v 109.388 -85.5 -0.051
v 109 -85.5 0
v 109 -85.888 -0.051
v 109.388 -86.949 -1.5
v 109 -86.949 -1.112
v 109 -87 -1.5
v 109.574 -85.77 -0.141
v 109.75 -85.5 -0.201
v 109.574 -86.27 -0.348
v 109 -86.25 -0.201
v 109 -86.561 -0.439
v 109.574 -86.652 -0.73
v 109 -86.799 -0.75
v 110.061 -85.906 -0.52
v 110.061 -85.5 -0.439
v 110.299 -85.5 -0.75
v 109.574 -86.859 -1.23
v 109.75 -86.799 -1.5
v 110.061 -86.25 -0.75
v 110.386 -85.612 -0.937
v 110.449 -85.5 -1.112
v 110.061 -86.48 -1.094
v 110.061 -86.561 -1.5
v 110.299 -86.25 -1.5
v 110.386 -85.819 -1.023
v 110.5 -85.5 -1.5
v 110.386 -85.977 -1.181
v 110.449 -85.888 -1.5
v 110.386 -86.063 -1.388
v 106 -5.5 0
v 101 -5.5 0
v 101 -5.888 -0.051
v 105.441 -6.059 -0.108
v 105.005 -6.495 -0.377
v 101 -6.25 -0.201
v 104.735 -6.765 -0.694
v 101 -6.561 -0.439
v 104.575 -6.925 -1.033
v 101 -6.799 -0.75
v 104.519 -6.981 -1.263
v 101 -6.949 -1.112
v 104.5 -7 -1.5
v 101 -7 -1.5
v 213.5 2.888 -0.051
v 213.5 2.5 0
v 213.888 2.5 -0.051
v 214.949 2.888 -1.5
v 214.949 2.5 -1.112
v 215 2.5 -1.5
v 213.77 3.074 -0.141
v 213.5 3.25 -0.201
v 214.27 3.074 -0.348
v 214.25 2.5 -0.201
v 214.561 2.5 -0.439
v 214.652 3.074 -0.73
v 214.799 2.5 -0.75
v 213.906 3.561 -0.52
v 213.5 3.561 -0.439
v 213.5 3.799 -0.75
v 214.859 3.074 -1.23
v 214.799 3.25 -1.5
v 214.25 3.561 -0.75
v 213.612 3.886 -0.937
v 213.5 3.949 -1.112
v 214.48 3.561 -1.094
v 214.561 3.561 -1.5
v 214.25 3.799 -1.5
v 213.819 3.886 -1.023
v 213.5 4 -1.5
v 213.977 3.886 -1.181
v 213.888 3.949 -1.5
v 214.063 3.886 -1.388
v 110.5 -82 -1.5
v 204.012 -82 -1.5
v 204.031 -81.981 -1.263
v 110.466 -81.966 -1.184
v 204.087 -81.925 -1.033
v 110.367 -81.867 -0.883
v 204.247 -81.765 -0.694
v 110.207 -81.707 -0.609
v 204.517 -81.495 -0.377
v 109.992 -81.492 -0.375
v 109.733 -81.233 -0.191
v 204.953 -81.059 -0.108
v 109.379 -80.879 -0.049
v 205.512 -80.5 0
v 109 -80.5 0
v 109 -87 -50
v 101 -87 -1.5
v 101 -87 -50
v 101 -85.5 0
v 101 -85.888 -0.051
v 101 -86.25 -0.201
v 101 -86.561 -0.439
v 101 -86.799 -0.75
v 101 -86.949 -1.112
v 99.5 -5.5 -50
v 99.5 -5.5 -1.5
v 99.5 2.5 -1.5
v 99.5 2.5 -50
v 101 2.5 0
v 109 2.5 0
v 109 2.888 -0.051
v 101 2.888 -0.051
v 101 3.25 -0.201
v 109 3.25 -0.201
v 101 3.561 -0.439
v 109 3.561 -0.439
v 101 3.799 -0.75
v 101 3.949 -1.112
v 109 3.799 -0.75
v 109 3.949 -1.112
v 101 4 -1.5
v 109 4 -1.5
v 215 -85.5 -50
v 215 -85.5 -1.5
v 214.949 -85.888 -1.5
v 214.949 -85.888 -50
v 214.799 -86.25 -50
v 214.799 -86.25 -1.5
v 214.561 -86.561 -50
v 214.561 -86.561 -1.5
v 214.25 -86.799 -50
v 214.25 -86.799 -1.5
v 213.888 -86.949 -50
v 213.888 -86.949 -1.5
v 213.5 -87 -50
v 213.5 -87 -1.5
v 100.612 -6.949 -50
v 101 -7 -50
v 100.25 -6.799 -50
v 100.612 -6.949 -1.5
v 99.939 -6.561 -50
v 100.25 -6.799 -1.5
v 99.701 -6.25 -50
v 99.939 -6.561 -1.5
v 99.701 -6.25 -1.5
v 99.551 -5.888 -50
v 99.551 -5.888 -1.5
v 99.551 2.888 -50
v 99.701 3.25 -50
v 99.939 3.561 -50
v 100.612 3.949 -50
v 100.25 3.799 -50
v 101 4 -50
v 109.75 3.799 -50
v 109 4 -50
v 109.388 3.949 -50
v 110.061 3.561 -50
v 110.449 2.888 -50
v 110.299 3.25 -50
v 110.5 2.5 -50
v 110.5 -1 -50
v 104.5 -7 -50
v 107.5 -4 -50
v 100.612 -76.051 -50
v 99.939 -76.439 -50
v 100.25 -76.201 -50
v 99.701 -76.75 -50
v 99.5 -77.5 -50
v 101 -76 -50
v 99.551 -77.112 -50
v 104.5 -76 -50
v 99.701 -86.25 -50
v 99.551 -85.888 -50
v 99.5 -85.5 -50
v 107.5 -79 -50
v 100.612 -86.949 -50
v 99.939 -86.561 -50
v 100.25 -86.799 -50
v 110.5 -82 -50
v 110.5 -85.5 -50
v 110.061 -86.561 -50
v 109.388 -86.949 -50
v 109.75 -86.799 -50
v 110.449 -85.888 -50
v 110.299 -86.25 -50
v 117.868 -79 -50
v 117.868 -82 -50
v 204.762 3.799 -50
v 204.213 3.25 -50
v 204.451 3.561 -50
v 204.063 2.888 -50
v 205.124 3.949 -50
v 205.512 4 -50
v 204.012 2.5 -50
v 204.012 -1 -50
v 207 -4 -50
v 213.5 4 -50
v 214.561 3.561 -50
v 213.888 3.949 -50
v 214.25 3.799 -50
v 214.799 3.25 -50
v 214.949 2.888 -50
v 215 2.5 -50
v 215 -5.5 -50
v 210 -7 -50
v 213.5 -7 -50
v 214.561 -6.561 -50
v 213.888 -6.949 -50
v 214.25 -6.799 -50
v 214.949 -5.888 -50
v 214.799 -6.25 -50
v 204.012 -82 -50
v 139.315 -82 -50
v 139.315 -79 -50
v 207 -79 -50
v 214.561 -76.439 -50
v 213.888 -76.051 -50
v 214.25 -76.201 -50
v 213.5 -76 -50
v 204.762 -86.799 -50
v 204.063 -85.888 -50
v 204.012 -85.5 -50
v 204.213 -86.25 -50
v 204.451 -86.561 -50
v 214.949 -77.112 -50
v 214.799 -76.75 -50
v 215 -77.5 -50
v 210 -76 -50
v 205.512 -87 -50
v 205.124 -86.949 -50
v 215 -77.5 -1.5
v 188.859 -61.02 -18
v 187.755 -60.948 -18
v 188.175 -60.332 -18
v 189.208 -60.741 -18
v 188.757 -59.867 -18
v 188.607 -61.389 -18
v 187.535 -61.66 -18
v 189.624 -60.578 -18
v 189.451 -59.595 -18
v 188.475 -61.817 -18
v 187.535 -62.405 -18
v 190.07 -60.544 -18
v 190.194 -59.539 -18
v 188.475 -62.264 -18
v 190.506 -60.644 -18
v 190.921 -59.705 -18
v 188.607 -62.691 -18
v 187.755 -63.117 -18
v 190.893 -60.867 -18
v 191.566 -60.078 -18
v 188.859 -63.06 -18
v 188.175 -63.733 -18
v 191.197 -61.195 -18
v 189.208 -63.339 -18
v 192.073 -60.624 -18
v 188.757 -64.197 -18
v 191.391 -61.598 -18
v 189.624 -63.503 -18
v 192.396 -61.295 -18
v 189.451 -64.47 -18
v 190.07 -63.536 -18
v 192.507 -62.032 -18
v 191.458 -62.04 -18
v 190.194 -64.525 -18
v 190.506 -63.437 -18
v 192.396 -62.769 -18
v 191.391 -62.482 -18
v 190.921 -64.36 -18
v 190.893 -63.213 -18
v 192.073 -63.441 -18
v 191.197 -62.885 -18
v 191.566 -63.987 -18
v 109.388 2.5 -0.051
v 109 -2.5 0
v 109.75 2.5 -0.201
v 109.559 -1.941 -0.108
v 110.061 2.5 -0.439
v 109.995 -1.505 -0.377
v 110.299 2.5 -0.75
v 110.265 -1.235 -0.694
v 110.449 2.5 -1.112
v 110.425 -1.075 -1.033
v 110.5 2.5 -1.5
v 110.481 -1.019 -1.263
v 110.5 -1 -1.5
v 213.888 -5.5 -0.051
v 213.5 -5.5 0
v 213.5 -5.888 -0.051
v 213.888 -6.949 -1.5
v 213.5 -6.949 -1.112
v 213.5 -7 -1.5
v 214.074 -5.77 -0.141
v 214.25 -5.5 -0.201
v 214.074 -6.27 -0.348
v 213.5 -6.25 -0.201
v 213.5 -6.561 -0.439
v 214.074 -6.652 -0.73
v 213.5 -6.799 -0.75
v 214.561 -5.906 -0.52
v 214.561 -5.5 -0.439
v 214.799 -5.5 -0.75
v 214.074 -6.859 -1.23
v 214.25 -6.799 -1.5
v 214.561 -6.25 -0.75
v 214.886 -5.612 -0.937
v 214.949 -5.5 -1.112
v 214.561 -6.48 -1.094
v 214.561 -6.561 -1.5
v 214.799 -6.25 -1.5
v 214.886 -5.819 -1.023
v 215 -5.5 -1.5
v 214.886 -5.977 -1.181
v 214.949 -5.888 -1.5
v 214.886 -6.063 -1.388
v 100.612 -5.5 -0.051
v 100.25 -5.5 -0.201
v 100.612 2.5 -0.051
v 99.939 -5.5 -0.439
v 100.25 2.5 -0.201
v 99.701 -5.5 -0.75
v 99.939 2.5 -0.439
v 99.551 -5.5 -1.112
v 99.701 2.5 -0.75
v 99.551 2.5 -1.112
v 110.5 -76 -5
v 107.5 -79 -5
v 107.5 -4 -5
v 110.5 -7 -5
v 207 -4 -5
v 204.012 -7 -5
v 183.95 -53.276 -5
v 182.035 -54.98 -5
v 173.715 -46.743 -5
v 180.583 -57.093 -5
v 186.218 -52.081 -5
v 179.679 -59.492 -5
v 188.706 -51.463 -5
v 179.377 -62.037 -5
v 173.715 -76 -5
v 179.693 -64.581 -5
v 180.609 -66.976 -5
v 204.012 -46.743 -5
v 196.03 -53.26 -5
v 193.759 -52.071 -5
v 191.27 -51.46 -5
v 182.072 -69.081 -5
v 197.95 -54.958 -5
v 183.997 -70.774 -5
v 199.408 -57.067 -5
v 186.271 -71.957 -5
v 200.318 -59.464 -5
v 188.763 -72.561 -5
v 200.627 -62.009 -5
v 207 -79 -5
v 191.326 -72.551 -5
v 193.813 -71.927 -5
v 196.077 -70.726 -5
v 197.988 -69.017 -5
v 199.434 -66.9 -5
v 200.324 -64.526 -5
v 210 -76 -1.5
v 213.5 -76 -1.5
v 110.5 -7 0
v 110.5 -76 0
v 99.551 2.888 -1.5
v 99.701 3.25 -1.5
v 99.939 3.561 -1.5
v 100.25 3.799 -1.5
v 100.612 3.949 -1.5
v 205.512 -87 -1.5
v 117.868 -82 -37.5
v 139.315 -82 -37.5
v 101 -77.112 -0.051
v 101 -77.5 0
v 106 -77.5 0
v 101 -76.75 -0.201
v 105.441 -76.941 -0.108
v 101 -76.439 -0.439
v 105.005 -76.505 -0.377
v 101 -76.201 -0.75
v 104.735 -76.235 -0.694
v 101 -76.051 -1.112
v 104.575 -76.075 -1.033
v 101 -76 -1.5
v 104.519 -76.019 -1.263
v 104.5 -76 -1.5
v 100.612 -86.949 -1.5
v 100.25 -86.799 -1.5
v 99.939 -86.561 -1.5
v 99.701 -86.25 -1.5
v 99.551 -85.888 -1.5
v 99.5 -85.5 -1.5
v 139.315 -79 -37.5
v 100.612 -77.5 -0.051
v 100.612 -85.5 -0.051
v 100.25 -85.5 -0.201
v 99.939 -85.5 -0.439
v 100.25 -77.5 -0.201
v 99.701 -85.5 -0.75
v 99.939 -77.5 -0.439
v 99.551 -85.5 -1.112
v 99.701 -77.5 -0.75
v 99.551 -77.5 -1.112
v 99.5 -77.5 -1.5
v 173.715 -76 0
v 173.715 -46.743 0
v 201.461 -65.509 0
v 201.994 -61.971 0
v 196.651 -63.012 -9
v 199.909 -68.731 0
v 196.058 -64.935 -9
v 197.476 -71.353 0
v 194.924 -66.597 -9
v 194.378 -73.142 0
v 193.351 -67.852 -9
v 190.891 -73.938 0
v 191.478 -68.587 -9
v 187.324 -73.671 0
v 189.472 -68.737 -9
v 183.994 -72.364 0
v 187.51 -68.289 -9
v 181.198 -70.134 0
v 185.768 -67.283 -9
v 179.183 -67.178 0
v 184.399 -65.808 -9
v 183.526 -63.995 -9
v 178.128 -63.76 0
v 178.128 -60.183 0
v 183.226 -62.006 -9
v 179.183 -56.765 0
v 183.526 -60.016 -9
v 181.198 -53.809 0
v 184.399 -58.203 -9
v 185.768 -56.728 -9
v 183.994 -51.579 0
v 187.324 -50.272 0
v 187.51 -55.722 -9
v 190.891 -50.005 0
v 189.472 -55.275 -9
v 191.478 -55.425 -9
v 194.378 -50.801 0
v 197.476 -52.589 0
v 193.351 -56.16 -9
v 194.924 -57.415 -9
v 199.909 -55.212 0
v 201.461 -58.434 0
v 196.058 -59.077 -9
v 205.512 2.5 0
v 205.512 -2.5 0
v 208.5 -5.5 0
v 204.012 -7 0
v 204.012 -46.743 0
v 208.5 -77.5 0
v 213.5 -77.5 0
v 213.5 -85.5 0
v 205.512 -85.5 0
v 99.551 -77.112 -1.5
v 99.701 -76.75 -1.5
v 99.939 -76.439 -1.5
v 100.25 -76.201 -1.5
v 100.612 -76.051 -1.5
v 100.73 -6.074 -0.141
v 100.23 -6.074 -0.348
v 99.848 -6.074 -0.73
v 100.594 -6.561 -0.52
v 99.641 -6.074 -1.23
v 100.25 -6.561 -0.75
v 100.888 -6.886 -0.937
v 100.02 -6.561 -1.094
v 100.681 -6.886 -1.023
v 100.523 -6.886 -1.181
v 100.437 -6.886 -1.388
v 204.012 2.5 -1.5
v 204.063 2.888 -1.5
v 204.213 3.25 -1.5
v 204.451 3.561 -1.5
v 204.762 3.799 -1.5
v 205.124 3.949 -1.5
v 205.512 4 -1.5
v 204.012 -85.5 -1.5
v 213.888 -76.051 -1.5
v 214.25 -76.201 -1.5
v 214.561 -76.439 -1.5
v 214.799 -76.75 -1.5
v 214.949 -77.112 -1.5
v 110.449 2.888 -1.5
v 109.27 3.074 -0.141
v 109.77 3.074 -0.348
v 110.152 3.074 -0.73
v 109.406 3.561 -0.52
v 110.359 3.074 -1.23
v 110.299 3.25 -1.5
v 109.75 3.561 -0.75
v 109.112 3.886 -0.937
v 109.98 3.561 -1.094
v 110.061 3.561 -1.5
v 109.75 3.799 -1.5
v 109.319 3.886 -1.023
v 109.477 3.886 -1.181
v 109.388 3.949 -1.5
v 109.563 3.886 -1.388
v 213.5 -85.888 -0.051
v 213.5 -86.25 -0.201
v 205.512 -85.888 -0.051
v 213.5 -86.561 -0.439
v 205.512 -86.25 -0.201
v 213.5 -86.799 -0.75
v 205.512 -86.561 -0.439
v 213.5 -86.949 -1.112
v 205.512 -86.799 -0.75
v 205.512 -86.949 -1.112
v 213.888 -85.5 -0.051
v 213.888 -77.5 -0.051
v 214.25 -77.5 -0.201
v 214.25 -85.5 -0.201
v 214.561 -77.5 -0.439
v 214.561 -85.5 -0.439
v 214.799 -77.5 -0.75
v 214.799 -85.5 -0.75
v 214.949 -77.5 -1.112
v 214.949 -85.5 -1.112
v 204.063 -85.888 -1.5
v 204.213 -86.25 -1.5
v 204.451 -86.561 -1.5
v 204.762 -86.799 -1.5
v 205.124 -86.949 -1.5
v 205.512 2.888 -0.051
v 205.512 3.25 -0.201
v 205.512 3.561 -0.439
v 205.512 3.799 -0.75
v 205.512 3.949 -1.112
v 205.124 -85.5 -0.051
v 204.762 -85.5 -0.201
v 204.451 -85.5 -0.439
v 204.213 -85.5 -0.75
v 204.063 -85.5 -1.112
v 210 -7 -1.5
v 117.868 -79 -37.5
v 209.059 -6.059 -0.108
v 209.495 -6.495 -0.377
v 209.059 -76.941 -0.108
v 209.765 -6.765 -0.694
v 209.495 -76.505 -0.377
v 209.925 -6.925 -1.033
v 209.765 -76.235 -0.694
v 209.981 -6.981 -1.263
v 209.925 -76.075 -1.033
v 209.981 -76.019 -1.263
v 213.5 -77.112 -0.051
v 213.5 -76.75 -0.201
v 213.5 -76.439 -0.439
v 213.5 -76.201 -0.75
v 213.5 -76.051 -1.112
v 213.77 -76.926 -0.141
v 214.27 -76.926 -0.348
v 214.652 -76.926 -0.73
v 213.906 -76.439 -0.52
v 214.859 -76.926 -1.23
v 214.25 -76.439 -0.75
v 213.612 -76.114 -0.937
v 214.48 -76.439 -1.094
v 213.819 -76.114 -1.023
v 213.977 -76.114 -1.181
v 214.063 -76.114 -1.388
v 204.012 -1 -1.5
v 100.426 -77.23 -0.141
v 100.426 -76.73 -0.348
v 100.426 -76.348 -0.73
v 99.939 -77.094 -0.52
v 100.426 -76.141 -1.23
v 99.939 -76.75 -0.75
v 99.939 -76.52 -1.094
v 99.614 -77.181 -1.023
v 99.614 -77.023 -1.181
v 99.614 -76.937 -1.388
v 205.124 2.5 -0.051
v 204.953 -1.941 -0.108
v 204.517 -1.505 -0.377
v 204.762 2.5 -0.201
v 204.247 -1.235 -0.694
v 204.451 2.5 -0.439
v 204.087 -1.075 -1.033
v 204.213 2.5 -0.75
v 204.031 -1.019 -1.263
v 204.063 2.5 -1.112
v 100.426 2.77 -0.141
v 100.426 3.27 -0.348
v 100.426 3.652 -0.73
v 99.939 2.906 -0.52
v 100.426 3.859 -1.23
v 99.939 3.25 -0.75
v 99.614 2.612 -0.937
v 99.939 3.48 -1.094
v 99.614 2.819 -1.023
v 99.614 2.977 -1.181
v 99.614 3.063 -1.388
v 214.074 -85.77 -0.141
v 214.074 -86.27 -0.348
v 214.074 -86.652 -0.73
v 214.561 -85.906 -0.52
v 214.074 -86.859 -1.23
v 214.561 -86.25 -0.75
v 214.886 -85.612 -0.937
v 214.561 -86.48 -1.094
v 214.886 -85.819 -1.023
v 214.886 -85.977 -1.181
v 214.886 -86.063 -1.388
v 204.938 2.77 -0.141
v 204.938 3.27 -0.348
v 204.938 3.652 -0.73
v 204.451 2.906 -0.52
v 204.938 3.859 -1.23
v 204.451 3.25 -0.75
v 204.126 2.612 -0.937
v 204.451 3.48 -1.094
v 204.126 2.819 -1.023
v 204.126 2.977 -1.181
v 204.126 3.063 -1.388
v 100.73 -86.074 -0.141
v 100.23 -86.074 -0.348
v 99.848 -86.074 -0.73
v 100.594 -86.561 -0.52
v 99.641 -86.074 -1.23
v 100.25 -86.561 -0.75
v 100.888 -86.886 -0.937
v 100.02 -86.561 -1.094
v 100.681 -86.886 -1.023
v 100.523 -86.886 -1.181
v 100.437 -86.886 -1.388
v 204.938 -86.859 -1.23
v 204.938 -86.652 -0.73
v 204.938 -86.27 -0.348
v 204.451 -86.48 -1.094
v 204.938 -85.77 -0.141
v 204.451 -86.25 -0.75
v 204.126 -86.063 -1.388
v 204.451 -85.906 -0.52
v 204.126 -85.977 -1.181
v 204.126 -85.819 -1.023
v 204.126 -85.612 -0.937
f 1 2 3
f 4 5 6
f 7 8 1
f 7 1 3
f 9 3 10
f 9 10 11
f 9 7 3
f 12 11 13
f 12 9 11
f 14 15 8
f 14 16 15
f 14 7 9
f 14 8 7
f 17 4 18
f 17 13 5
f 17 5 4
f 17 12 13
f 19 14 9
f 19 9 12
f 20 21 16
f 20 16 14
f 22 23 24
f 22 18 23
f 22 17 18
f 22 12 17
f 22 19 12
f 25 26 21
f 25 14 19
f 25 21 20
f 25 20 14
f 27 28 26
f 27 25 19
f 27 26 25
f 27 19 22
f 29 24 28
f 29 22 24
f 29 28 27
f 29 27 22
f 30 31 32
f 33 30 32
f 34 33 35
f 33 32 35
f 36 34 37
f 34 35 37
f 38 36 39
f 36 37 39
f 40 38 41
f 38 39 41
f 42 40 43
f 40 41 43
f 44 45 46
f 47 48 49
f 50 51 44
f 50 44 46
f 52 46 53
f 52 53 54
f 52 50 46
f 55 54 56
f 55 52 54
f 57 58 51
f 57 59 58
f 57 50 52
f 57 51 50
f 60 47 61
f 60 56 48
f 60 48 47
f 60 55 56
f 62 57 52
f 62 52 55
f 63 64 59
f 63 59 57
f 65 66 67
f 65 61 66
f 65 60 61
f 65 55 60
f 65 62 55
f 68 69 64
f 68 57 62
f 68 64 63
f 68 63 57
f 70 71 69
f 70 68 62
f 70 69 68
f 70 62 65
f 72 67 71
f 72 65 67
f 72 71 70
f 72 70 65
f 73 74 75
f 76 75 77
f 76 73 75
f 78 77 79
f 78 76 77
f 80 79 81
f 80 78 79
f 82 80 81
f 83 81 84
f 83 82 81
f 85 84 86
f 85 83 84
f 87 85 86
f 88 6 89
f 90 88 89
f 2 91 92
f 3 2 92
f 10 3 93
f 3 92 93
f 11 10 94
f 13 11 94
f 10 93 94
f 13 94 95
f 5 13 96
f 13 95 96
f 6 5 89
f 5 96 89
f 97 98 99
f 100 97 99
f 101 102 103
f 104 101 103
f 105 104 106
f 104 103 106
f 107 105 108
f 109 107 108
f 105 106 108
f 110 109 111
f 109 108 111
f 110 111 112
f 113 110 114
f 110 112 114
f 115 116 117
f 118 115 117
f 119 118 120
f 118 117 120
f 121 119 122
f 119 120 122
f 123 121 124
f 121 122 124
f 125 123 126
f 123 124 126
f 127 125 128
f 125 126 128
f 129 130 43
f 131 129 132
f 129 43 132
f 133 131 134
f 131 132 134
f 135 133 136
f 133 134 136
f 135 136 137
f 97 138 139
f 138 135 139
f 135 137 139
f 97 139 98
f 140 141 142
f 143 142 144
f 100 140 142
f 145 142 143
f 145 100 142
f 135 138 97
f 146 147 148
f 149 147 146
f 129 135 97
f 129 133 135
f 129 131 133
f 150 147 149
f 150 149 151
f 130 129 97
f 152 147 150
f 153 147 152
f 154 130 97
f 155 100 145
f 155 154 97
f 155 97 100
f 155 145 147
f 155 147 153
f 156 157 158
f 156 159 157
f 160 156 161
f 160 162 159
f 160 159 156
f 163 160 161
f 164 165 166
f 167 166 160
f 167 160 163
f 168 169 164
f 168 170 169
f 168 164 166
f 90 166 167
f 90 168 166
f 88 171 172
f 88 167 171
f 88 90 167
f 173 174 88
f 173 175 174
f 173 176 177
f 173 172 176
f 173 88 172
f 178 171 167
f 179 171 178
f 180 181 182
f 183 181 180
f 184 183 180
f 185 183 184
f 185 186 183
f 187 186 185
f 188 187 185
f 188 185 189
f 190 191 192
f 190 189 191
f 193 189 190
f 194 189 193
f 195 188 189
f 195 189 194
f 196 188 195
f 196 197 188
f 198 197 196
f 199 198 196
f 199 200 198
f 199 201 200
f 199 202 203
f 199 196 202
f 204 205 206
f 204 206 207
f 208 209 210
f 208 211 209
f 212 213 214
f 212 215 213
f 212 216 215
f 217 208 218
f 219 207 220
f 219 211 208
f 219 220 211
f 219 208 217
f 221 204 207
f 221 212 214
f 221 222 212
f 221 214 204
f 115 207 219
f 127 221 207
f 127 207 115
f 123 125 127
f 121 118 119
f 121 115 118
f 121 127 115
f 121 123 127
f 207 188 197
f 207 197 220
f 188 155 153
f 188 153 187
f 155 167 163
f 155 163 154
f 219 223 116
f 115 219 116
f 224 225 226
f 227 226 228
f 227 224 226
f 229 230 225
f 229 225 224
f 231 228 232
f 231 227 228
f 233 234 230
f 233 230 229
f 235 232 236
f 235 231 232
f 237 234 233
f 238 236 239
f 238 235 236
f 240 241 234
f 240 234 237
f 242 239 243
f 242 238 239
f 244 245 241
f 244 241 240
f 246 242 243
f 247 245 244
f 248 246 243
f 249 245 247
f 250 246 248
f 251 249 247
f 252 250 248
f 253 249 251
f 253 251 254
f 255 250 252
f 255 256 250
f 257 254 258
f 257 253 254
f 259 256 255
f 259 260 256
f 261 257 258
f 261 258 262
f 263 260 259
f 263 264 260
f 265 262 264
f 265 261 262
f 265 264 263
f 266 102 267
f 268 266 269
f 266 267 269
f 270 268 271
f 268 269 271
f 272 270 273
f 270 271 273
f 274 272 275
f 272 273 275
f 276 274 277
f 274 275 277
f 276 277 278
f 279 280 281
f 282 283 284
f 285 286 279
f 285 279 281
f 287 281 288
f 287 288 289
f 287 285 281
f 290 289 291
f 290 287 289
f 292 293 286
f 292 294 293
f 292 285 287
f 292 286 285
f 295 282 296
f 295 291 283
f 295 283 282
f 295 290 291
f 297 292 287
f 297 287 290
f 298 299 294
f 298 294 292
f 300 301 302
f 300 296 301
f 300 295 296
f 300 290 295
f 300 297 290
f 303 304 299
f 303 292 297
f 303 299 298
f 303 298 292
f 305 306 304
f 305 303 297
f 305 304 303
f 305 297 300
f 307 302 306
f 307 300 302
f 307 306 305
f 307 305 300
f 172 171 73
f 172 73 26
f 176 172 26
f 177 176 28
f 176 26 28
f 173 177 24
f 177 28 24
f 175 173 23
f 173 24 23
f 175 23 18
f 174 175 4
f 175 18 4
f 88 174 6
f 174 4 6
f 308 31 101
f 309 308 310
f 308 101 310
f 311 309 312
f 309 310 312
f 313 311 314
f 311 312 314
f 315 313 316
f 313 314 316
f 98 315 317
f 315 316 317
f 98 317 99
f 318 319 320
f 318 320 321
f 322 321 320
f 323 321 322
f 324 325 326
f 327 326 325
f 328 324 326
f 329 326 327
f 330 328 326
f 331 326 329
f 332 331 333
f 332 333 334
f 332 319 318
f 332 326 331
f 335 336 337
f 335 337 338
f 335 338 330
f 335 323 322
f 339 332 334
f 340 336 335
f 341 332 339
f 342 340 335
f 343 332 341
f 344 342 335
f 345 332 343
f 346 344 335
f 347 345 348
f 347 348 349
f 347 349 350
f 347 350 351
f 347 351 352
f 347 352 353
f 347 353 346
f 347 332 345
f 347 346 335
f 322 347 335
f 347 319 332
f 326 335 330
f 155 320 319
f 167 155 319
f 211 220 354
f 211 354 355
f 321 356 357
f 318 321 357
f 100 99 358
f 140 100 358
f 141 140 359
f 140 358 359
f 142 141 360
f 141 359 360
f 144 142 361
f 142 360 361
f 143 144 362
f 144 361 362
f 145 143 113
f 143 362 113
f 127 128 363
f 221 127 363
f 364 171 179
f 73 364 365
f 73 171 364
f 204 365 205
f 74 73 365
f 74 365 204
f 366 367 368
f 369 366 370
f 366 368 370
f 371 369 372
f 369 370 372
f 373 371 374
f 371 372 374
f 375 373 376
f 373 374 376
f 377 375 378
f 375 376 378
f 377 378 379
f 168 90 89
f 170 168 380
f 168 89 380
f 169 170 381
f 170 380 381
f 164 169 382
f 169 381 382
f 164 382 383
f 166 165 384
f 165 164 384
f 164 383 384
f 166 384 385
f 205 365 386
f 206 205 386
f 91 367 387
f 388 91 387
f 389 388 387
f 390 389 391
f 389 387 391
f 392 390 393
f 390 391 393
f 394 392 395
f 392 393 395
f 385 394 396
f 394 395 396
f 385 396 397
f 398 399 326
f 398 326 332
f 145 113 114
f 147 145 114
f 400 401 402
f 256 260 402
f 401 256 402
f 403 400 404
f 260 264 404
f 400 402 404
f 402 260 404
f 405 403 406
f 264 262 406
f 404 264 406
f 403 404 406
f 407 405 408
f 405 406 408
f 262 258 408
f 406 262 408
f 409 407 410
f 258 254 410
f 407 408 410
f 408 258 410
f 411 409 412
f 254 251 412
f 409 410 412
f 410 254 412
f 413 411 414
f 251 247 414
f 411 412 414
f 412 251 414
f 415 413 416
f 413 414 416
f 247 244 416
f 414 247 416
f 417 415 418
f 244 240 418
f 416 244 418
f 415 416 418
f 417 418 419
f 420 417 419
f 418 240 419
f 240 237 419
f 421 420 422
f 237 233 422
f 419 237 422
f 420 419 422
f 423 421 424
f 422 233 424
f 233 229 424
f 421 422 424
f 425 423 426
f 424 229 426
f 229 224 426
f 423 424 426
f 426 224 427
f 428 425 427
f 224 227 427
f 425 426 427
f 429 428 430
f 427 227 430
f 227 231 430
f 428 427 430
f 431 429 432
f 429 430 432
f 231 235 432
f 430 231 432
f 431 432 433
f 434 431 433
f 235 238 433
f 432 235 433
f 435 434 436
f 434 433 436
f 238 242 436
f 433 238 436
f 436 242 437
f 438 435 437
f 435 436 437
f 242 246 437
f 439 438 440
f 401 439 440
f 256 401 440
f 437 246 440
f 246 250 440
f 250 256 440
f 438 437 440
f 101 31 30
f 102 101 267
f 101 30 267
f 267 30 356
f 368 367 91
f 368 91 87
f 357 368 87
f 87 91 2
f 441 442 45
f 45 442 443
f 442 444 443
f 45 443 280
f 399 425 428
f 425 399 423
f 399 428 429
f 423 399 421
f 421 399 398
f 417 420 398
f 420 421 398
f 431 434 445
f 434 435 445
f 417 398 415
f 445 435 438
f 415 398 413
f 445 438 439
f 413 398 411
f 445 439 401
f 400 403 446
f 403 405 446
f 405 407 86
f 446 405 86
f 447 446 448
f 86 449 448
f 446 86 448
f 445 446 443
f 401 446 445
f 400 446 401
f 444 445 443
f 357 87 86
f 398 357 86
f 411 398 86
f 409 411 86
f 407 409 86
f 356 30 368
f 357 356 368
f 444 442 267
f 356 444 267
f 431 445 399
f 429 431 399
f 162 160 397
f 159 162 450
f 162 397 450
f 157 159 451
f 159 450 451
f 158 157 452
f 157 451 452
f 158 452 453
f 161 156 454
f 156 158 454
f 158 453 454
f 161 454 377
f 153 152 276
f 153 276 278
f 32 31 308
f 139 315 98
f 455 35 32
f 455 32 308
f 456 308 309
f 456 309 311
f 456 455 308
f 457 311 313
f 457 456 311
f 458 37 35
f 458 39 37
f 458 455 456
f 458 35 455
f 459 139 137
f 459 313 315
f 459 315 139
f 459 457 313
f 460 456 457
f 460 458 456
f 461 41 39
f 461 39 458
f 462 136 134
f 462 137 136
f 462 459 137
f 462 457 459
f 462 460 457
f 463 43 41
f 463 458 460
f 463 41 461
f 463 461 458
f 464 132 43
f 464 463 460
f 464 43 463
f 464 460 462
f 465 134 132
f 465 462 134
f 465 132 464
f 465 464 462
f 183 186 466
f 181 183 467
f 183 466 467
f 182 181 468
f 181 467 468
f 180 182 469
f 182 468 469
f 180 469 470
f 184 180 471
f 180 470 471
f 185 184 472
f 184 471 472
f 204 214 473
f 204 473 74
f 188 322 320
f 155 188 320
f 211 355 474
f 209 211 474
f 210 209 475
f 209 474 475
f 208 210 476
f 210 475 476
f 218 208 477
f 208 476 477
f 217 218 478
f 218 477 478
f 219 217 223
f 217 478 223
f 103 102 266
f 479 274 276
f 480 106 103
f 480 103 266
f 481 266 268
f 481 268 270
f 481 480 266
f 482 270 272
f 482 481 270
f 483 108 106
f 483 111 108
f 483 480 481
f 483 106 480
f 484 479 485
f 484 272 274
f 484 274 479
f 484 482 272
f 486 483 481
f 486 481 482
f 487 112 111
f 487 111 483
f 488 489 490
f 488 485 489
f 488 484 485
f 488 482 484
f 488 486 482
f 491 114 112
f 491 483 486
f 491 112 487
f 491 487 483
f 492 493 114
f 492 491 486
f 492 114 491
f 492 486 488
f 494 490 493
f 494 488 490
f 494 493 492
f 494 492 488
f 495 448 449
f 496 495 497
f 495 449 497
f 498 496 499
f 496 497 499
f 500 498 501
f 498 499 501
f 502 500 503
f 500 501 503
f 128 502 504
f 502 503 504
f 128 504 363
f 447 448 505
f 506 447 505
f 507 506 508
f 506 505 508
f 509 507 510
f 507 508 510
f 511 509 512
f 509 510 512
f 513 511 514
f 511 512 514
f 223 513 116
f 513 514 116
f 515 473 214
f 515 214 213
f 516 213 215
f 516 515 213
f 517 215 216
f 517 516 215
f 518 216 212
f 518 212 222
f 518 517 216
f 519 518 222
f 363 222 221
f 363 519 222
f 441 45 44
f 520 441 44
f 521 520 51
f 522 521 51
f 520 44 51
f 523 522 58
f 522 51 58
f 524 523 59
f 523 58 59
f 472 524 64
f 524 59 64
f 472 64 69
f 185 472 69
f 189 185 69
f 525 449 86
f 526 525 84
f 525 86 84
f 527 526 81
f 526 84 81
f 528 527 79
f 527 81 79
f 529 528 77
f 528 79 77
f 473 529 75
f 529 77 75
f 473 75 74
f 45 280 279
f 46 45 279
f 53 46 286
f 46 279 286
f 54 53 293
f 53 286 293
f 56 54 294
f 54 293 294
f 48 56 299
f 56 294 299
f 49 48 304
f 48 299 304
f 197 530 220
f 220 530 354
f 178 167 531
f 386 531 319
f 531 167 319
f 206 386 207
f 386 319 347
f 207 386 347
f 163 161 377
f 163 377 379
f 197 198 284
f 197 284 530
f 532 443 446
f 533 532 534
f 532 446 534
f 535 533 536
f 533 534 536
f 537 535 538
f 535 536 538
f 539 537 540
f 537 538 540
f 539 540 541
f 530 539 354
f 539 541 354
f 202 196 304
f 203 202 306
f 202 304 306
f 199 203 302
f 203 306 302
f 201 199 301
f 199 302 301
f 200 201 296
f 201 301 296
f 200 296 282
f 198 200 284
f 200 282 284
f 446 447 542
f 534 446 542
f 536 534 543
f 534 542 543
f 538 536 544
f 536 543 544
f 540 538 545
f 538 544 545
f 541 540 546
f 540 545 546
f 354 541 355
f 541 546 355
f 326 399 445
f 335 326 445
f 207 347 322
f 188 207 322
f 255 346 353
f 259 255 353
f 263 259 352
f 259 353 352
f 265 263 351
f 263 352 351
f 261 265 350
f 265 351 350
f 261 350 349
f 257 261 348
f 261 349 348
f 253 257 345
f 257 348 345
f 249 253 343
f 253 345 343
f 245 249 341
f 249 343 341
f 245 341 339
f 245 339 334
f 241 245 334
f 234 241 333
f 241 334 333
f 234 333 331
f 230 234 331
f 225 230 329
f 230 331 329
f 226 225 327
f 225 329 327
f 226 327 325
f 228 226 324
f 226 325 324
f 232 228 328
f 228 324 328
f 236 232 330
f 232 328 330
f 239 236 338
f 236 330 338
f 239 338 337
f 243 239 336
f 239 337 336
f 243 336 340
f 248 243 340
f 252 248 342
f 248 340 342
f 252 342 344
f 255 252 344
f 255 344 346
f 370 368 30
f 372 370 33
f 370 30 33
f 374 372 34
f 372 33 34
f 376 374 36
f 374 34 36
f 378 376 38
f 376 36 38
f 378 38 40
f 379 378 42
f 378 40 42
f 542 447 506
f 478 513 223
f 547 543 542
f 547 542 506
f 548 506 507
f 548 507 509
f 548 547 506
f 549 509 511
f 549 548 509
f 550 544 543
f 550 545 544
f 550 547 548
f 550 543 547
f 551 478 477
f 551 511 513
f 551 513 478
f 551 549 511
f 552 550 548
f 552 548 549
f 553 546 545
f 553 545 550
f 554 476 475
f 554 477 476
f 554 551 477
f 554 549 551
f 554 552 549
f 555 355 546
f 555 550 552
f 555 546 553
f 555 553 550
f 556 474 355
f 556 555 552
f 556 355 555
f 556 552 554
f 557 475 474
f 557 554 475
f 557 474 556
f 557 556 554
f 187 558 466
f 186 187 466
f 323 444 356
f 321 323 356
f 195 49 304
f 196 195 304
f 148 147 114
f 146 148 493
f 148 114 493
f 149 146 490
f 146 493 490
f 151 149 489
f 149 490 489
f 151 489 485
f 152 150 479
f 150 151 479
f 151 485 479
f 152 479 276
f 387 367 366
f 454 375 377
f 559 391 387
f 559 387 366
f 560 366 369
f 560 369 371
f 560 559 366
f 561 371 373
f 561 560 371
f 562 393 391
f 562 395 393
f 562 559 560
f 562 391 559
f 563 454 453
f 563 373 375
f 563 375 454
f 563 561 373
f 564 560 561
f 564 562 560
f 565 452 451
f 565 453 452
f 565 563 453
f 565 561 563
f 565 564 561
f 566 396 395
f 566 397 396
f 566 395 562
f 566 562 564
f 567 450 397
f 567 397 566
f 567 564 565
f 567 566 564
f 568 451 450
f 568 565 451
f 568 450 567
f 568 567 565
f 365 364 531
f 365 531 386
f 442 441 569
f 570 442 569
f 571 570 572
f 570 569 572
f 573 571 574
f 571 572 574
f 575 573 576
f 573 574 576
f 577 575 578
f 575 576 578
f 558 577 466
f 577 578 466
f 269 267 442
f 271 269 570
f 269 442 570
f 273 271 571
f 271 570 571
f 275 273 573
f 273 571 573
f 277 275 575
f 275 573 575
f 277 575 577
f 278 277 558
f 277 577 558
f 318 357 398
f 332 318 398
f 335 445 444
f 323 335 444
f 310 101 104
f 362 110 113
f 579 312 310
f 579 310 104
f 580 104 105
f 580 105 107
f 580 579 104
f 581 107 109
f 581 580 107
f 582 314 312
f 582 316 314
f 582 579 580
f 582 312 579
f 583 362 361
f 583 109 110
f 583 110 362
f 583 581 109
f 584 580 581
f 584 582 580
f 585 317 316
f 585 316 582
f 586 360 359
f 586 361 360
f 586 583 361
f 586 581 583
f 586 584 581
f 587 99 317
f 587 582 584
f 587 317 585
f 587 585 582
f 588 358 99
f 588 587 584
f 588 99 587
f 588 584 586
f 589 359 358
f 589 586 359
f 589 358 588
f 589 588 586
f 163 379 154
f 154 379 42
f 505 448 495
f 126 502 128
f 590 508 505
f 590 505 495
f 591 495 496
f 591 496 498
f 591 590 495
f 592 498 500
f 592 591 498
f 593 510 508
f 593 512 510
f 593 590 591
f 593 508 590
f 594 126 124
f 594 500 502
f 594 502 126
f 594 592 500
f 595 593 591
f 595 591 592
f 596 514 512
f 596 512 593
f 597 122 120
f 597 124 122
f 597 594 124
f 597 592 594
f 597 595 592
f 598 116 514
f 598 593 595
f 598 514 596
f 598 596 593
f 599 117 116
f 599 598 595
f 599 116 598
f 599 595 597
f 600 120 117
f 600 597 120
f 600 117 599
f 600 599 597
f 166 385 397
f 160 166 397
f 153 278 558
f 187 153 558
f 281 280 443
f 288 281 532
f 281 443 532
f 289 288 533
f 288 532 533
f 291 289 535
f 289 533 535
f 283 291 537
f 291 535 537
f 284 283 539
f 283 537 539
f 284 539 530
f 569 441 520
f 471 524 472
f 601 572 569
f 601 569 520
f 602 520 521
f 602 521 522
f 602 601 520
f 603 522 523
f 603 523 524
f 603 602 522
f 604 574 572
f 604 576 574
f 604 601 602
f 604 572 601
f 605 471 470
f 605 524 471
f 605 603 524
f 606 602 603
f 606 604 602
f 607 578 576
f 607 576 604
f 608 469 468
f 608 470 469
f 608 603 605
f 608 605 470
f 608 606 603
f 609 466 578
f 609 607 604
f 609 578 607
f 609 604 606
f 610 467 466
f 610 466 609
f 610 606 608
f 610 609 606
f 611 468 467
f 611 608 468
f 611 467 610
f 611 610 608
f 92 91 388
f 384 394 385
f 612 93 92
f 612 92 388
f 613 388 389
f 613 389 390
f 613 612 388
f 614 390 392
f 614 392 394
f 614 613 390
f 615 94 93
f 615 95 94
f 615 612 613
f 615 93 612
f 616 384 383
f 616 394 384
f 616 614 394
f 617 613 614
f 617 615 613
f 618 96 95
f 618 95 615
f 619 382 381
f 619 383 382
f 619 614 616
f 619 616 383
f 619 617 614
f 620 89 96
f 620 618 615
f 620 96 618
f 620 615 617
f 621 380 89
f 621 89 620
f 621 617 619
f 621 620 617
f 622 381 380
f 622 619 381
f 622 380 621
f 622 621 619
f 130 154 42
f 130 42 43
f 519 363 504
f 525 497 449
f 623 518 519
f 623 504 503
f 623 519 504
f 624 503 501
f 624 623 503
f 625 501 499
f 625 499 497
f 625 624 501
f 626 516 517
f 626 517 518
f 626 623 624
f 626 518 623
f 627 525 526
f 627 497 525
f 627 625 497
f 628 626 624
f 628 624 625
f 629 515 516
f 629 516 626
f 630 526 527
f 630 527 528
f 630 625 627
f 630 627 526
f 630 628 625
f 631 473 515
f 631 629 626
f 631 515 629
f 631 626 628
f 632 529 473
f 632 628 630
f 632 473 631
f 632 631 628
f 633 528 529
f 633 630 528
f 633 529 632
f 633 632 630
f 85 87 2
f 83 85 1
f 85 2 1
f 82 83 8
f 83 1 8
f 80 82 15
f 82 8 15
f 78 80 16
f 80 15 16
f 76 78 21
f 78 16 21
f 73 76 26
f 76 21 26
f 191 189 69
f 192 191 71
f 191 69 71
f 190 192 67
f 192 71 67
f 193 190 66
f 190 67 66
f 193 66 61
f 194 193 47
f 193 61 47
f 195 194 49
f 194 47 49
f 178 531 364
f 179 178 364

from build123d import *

# Parameters (mm, degrees)
F0_W          = 60.594435811
F0_H          = 58.5138263702
F0_R          = 27.5
F3_DEPTH      = 10
F4_R          = 5
F6_R          = 24
F7_R          = 3
F9_DEPTH      = 10
F10_DEPTH     = 100
F0_W_2        = 42.894218117
F0_H_2        = 6
F11_DEPTH     = 75
F12_R         = 3
F13_T1_DEPTH  = 104.5
F13_S5_W      = 3
F13_S5_H      = 3
F13_T6_DEPTH  = 3
F13_S11_W     = 3
F13_S11_H     = 3
F13_T12_DEPTH = 3
F13_S17_W     = 3
F13_S17_H     = 3
F13_T18_DEPTH = 3
F13_S23_W     = 3
F13_S23_H     = 3
F13_T24_DEPTH = 3
F13_S29_W     = 3
F13_S29_H     = 3
F13_T30_DEPTH = 3
F13_S35_W     = 3
F13_S35_H     = 3
F13_T36_DEPTH = 3
F13_S41_W     = 3
F13_S41_H     = 3
F13_T42_DEPTH = 3
F13_S47_W     = 3
F13_S47_H     = 3
F13_T48_DEPTH = 3
F13_S53_W     = 3
F13_S53_H     = 3
F13_T54_DEPTH = 3
F13_S59_W     = 3
F13_S59_H     = 3
F13_T60_DEPTH = 3
F13_S65_W     = 3
F13_S65_H     = 3
F13_T66_DEPTH = 3
F13_S71_W     = 3
F13_S71_H     = 3
F13_T72_DEPTH = 3
F14_SCALE     = 0.5
F15_ANGLE     = 180


# Not quite as in the source:
# - a fillet or chamfer that OpenCascade refuses, or shapes differently, is made with other operations: its cross-section is extruded or revolved along the edge and cut away or added


with BuildPart() as f3:
    # F0 (on Top) → F3 (new body)
    with BuildSketch(Plane.XY):
        with Locations((162.7266414762, 114.7430868149)):
            Rectangle(F0_W, F0_H)
        with Locations((165, 116)):
            Circle(F0_R, mode=Mode.SUBTRACT)
        with Locations((165, 116)):
            Circle(F0_R)
    extrude(amount=F3_DEPTH)

    # F4 (on offset) → F5 section 0
    with BuildSketch(Plane.XY.offset(36)):
        with Locations((165.0143116713, 116.0647049546)):
            Circle(F4_R)
    # F0 (on Top) → F5 section 1
    with BuildSketch(Plane.XY):
        with Locations((165, 116)):
            Circle(F0_R)
    loft()

    # F6 (on Top) → F8 section 0
    with BuildSketch(Plane.XY):
        with Locations((164.9883985519, 115.9429103136)):
            Circle(F6_R)
    # F7 (on offset) → F8 section 1
    with BuildSketch(Plane.XY.offset(36)):
        with Locations((164.916202426, 116.0804182291)):
            Circle(F7_R)
    loft(mode=Mode.SUBTRACT)

    # F0 (on Top) → F9 (join)
    with BuildSketch(Plane.XY):
        Polygon((0, 150), (0, 0), (199, 0), (199, 150), (63.6303052306, 150), (20.7360871136, 150), align=None)
        Polygon((193.0238593817, 6), (6, 6), (6, 144), (132.4294235706, 144), (193.0238593817, 144), (193.0238593817, 85.4861736298), align=None, mode=Mode.SUBTRACT)
    extrude(amount=F9_DEPTH)

    # F0 (on Top) → F10 (join)
    with BuildSketch(Plane.XY):
        Polygon((199, 0), (0, 0), (0, 150), (20.7360871136, 150), (20.7360871136, 156), (6, 156), (6, 166), (-16, 166), (-16, 144), (-6, 144), (-6, 6), (-16, 6), (-16, -16), (6, -16), (6, -6), (193.0238593817, -6), (193.0238593817, -16), (215, -16), (215, 6), (205, 6), (205, 144), (215, 144), (215, 166), (193.0238593817, 166), (193.0238593817, 156), (63.6303052306, 156), (63.6303052306, 150), (199, 150), align=None)
    extrude(amount=F10_DEPTH)

    # F0 (on Top) → F11 (join)
    with BuildSketch(Plane.XY):
        with Locations((42.1831961721, 153)):
            Rectangle(F0_W_2, F0_H_2)
    extrude(amount=F11_DEPTH)

    # F12
    f12_edges = [f3.edges().sort_by_distance(p)[0] for p in [
        (204.01193, -16, 0),
        (215, -5, 0),
        (205, 75, 0),
        (210, 6, 0),
        (210, 144, 0),
        (215, 155, 0),
        (204.01193, 166, 0),
        (193.023859, 161, 0),
        (99.51193, 156, 0),
        (-5, 166, 0),
        (6, 161, 0),
        (-16, 155, 0),
        (-11, 144, 0),
        (-6, 75, 0),
        (-11, 6, 0),
        (-5, -16, 0),
        (-16, -5, 0),
        (6, -11, 0),
        (99.51193, -6, 0),
        (193.023859, -11, 0),
    ]]
    fillet(f12_edges, radius=F12_R)

    # F13: fillet of radius 3 on 12 edges, made by hand

    # F13_s2 → F13_t1 (cut)
    with BuildSketch(Plane.XY.offset(3)):
        with BuildLine():
            ThreePointArc((212, -16), (214.1213203436, -15.1213203436), (215, -13))
            Line((215, -13), (215, -16))
            Line((215, -16), (212, -16))
        make_face()
        with BuildLine():
            ThreePointArc((193.0238593817, -13), (193.9025390381, -15.1213203436), (196.0238593817, -16))
            Line((196.0238593817, -16), (193.0238593817, -16))
            Line((193.0238593817, -16), (193.0238593817, -13))
        make_face()
        with BuildLine():
            ThreePointArc((215, 3), (214.1213203436, 5.1213203436), (212, 6))
            Line((212, 6), (215, 6))
            Line((215, 6), (215, 3))
        make_face()
        with BuildLine():
            ThreePointArc((212, 144), (214.1213203436, 144.8786796564), (215, 147))
            Line((215, 147), (215, 144))
            Line((215, 144), (212, 144))
        make_face()
        with BuildLine():
            ThreePointArc((215, 163), (214.1213203436, 165.1213203436), (212, 166))
            Line((212, 166), (215, 166))
            Line((215, 166), (215, 163))
        make_face()
        with BuildLine():
            ThreePointArc((193.0238593817, 163), (193.9025390381, 165.1213203436), (196.0238593817, 166))
            Line((196.0238593817, 166), (193.0238593817, 166))
            Line((193.0238593817, 166), (193.0238593817, 163))
        make_face()
        with BuildLine():
            ThreePointArc((3, -16), (5.1213203436, -15.1213203436), (6, -13))
            Line((6, -13), (6, -16))
            Line((6, -16), (3, -16))
        make_face()
        with BuildLine():
            ThreePointArc((-16, -13), (-15.1213203436, -15.1213203436), (-13, -16))
            Line((-13, -16), (-16, -16))
            Line((-16, -16), (-16, -13))
        make_face()
        with BuildLine():
            ThreePointArc((-13, 6), (-15.1213203436, 5.1213203436), (-16, 3))
            Line((-16, 3), (-16, 6))
            Line((-16, 6), (-13, 6))
        make_face()
        with BuildLine():
            ThreePointArc((-16, 147), (-15.1213203436, 144.8786796564), (-13, 144))
            Line((-13, 144), (-16, 144))
            Line((-16, 144), (-16, 147))
        make_face()
        with BuildLine():
            ThreePointArc((-13, 166), (-15.1213203436, 165.1213203436), (-16, 163))
            Line((-16, 163), (-16, 166))
            Line((-16, 166), (-13, 166))
        make_face()
        with BuildLine():
            ThreePointArc((6, 163), (5.1213203436, 165.1213203436), (3, 166))
            Line((3, 166), (6, 166))
            Line((6, 166), (6, 163))
        make_face()
    extrude(amount=F13_T1_DEPTH, mode=Mode.SUBTRACT)


with BuildPart() as f13_tool4:
    # F13_s5 → F13_t6 (new body)
    with BuildSketch(Plane.YZ.offset(3)):
        with Locations((164.5, 1.5)):
            Rectangle(F13_S5_W, F13_S5_H)
    extrude(amount=F13_T6_DEPTH)

    # F13_s7 → F13_t8 (revolve, cut)
    with BuildSketch(Plane(origin=(3, 163, 3), x_dir=(0, -0.7071067812, 0.7071067812), z_dir=(0, 0.7071067812, 0.7071067812))):
        with BuildLine():
            ThreePointArc((0, -3), (3, 0), (0, 3))
            Line((0, 3), (0, -3))
        make_face()
    revolve(axis=Axis((3, 163, 3), (1, 0, 0)), mode=Mode.SUBTRACT)


with BuildPart() as f3_1:
    add(f3.part)

    # F13_t3: cut F13_tool4
    add(f13_tool4.part, mode=Mode.SUBTRACT)


with BuildPart() as f13_tool10:
    # F13_s11 → F13_t12 (new body)
    with BuildSketch(Plane.XZ.offset(-163)):
        with Locations((-14.5, 1.5)):
            Rectangle(F13_S11_W, F13_S11_H)
    extrude(amount=-F13_T12_DEPTH)

    # F13_s13 → F13_t14 (revolve, cut)
    with BuildSketch(Plane(origin=(-13, 163, 3), x_dir=(0.7071067812, 0, 0.7071067812), z_dir=(-0.7071067812, 0, 0.7071067812))):
        with BuildLine():
            ThreePointArc((0, -3), (3, 0), (0, 3))
            Line((0, 3), (0, -3))
        make_face()
    revolve(axis=Axis((-13, 163, 3), (0, 1, 0)), mode=Mode.SUBTRACT)


with BuildPart() as f3_2:
    add(f3_1.part)

    # F13_t9: cut F13_tool10
    add(f13_tool10.part, mode=Mode.SUBTRACT)


with BuildPart() as f13_tool16:
    # F13_s17 → F13_t18 (new body)
    with BuildSketch(Plane.YZ.offset(-13)):
        with Locations((145.5, 1.5)):
            Rectangle(F13_S17_W, F13_S17_H)
    extrude(amount=-F13_T18_DEPTH)

    # F13_s19 → F13_t20 (revolve, cut)
    with BuildSketch(Plane(origin=(-13, 147, 3), x_dir=(0, 0.7071067812, 0.7071067812), z_dir=(0, -0.7071067812, 0.7071067812))):
        with BuildLine():
            ThreePointArc((0, -3), (3, 0), (0, 3))
            Line((0, 3), (0, -3))
        make_face()
    revolve(axis=Axis((-13, 147, 3), (-1, 0, 0)), mode=Mode.SUBTRACT)


with BuildPart() as f3_3:
    add(f3_2.part)

    # F13_t15: cut F13_tool16
    add(f13_tool16.part, mode=Mode.SUBTRACT)


with BuildPart() as f13_tool22:
    # F13_s23 → F13_t24 (new body)
    with BuildSketch(Plane.XZ.offset(-3)):
        with Locations((-14.5, 1.5)):
            Rectangle(F13_S23_W, F13_S23_H)
    extrude(amount=-F13_T24_DEPTH)

    # F13_s25 → F13_t26 (revolve, cut)
    with BuildSketch(Plane(origin=(-13, 3, 3), x_dir=(0.7071067812, 0, 0.7071067812), z_dir=(-0.7071067812, 0, 0.7071067812))):
        with BuildLine():
            ThreePointArc((0, -3), (3, 0), (0, 3))
            Line((0, 3), (0, -3))
        make_face()
    revolve(axis=Axis((-13, 3, 3), (0, 1, 0)), mode=Mode.SUBTRACT)


with BuildPart() as f3_4:
    add(f3_3.part)

    # F13_t21: cut F13_tool22
    add(f13_tool22.part, mode=Mode.SUBTRACT)


with BuildPart() as f13_tool28:
    # F13_s29 → F13_t30 (new body)
    with BuildSketch(Plane.YZ.offset(-13)):
        with Locations((-14.5, 1.5)):
            Rectangle(F13_S29_W, F13_S29_H)
    extrude(amount=-F13_T30_DEPTH)

    # F13_s31 → F13_t32 (revolve, cut)
    with BuildSketch(Plane(origin=(-13, -13, 3), x_dir=(0, 0.7071067812, 0.7071067812), z_dir=(0, -0.7071067812, 0.7071067812))):
        with BuildLine():
            ThreePointArc((0, -3), (3, 0), (0, 3))
            Line((0, 3), (0, -3))
        make_face()
    revolve(axis=Axis((-13, -13, 3), (-1, 0, 0)), mode=Mode.SUBTRACT)


with BuildPart() as f3_5:
    add(f3_4.part)

    # F13_t27: cut F13_tool28
    add(f13_tool28.part, mode=Mode.SUBTRACT)


with BuildPart() as f13_tool34:
    # F13_s35 → F13_t36 (new body)
    with BuildSketch(Plane.XZ.offset(13)):
        with Locations((4.5, 1.5)):
            Rectangle(F13_S35_W, F13_S35_H)
    extrude(amount=F13_T36_DEPTH)

    # F13_s37 → F13_t38 (revolve, cut)
    with BuildSketch(Plane(origin=(3, -13, 3), x_dir=(-0.7071067812, 0, 0.7071067812), z_dir=(0.7071067812, 0, 0.7071067812))):
        with BuildLine():
            ThreePointArc((0, -3), (3, 0), (0, 3))
            Line((0, 3), (0, -3))
        make_face()
    revolve(axis=Axis((3, -13, 3), (0, -1, 0)), mode=Mode.SUBTRACT)


with BuildPart() as f3_6:
    add(f3_5.part)

    # F13_t33: cut F13_tool34
    add(f13_tool34.part, mode=Mode.SUBTRACT)


with BuildPart() as f13_tool40:
    # F13_s41 → F13_t42 (new body)
    with BuildSketch(Plane.YZ.offset(196.0238593817)):
        with Locations((164.5, 1.5)):
            Rectangle(F13_S41_W, F13_S41_H)
    extrude(amount=-F13_T42_DEPTH)

    # F13_s43 → F13_t44 (revolve, cut)
    with BuildSketch(Plane(origin=(196.0238593817, 163, 3), x_dir=(0, -0.7071067812, 0.7071067812), z_dir=(0, -0.7071067812, -0.7071067812))):
        with BuildLine():
            ThreePointArc((0, -3), (3, 0), (0, 3))
            Line((0, 3), (0, -3))
        make_face()
    revolve(axis=Axis((196.0238593817, 163, 3), (-1, 0, 0)), mode=Mode.SUBTRACT)


with BuildPart() as f3_7:
    add(f3_6.part)

    # F13_t39: cut F13_tool40
    add(f13_tool40.part, mode=Mode.SUBTRACT)


with BuildPart() as f13_tool46:
    # F13_s47 → F13_t48 (new body)
    with BuildSketch(Plane.YZ.offset(212)):
        with Locations((164.5, 1.5)):
            Rectangle(F13_S47_W, F13_S47_H)
    extrude(amount=F13_T48_DEPTH)

    # F13_s49 → F13_t50 (revolve, cut)
    with BuildSketch(Plane(origin=(212, 163, 3), x_dir=(0, -0.7071067812, 0.7071067812), z_dir=(0, 0.7071067812, 0.7071067812))):
        with BuildLine():
            ThreePointArc((0, -3), (3, 0), (0, 3))
            Line((0, 3), (0, -3))
        make_face()
    revolve(axis=Axis((212, 163, 3), (1, 0, 0)), mode=Mode.SUBTRACT)


with BuildPart() as f3_8:
    add(f3_7.part)

    # F13_t45: cut F13_tool46
    add(f13_tool46.part, mode=Mode.SUBTRACT)


with BuildPart() as f13_tool52:
    # F13_s53 → F13_t54 (new body)
    with BuildSketch(Plane.XZ.offset(-147)):
        with Locations((213.5, 1.5)):
            Rectangle(F13_S53_W, F13_S53_H)
    extrude(amount=F13_T54_DEPTH)

    # F13_s55 → F13_t56 (revolve, cut)
    with BuildSketch(Plane(origin=(212, 147, 3), x_dir=(-0.7071067812, 0, 0.7071067812), z_dir=(0.7071067812, 0, 0.7071067812))):
        with BuildLine():
            ThreePointArc((0, -3), (3, 0), (0, 3))
            Line((0, 3), (0, -3))
        make_face()
    revolve(axis=Axis((212, 147, 3), (0, -1, 0)), mode=Mode.SUBTRACT)


with BuildPart() as f3_9:
    add(f3_8.part)

    # F13_t51: cut F13_tool52
    add(f13_tool52.part, mode=Mode.SUBTRACT)


with BuildPart() as f13_tool58:
    # F13_s59 → F13_t60 (new body)
    with BuildSketch(Plane.YZ.offset(212)):
        with Locations((4.5, 1.5)):
            Rectangle(F13_S59_W, F13_S59_H)
    extrude(amount=F13_T60_DEPTH)

    # F13_s61 → F13_t62 (revolve, cut)
    with BuildSketch(Plane(origin=(212, 3, 3), x_dir=(0, -0.7071067812, 0.7071067812), z_dir=(0, 0.7071067812, 0.7071067812))):
        with BuildLine():
            ThreePointArc((0, -3), (3, 0), (0, 3))
            Line((0, 3), (0, -3))
        make_face()
    revolve(axis=Axis((212, 3, 3), (1, 0, 0)), mode=Mode.SUBTRACT)


with BuildPart() as f3_10:
    add(f3_9.part)

    # F13_t57: cut F13_tool58
    add(f13_tool58.part, mode=Mode.SUBTRACT)


with BuildPart() as f13_tool64:
    # F13_s65 → F13_t66 (new body)
    with BuildSketch(Plane.YZ.offset(196.0238593817)):
        with Locations((-14.5, 1.5)):
            Rectangle(F13_S65_W, F13_S65_H)
    extrude(amount=-F13_T66_DEPTH)

    # F13_s67 → F13_t68 (revolve, cut)
    with BuildSketch(Plane(origin=(196.0238593817, -13, 3), x_dir=(0, 0.7071067812, 0.7071067812), z_dir=(0, -0.7071067812, 0.7071067812))):
        with BuildLine():
            ThreePointArc((0, -3), (3, 0), (0, 3))
            Line((0, 3), (0, -3))
        make_face()
    revolve(axis=Axis((196.0238593817, -13, 3), (-1, 0, 0)), mode=Mode.SUBTRACT)


with BuildPart() as f3_11:
    add(f3_10.part)

    # F13_t63: cut F13_tool64
    add(f13_tool64.part, mode=Mode.SUBTRACT)


with BuildPart() as f13_tool70:
    # F13_s71 → F13_t72 (new body)
    with BuildSketch(Plane.XZ.offset(13)):
        with Locations((213.5, 1.5)):
            Rectangle(F13_S71_W, F13_S71_H)
    extrude(amount=F13_T72_DEPTH)

    # F13_s73 → F13_t74 (revolve, cut)
    with BuildSketch(Plane(origin=(212, -13, 3), x_dir=(-0.7071067812, 0, 0.7071067812), z_dir=(0.7071067812, 0, 0.7071067812))):
        with BuildLine():
            ThreePointArc((0, -3), (3, 0), (0, 3))
            Line((0, 3), (0, -3))
        make_face()
    revolve(axis=Axis((212, -13, 3), (0, -1, 0)), mode=Mode.SUBTRACT)


with BuildPart() as f3_12:
    add(f3_11.part)

    # F13_t69: cut F13_tool70
    add(f13_tool70.part, mode=Mode.SUBTRACT)


with BuildPart() as f3_13:
    # F14: moved
    add(f3_12.part.scale(F14_SCALE).moved(Location((107.5, -8, 0))))


with BuildPart() as f3_14:
    # F15: moved
    add(f3_13.part.rotate(Axis((99.5119296908, -6, 0), (1, 0, 0)), F15_ANGLE))


solid = f3_14.part
